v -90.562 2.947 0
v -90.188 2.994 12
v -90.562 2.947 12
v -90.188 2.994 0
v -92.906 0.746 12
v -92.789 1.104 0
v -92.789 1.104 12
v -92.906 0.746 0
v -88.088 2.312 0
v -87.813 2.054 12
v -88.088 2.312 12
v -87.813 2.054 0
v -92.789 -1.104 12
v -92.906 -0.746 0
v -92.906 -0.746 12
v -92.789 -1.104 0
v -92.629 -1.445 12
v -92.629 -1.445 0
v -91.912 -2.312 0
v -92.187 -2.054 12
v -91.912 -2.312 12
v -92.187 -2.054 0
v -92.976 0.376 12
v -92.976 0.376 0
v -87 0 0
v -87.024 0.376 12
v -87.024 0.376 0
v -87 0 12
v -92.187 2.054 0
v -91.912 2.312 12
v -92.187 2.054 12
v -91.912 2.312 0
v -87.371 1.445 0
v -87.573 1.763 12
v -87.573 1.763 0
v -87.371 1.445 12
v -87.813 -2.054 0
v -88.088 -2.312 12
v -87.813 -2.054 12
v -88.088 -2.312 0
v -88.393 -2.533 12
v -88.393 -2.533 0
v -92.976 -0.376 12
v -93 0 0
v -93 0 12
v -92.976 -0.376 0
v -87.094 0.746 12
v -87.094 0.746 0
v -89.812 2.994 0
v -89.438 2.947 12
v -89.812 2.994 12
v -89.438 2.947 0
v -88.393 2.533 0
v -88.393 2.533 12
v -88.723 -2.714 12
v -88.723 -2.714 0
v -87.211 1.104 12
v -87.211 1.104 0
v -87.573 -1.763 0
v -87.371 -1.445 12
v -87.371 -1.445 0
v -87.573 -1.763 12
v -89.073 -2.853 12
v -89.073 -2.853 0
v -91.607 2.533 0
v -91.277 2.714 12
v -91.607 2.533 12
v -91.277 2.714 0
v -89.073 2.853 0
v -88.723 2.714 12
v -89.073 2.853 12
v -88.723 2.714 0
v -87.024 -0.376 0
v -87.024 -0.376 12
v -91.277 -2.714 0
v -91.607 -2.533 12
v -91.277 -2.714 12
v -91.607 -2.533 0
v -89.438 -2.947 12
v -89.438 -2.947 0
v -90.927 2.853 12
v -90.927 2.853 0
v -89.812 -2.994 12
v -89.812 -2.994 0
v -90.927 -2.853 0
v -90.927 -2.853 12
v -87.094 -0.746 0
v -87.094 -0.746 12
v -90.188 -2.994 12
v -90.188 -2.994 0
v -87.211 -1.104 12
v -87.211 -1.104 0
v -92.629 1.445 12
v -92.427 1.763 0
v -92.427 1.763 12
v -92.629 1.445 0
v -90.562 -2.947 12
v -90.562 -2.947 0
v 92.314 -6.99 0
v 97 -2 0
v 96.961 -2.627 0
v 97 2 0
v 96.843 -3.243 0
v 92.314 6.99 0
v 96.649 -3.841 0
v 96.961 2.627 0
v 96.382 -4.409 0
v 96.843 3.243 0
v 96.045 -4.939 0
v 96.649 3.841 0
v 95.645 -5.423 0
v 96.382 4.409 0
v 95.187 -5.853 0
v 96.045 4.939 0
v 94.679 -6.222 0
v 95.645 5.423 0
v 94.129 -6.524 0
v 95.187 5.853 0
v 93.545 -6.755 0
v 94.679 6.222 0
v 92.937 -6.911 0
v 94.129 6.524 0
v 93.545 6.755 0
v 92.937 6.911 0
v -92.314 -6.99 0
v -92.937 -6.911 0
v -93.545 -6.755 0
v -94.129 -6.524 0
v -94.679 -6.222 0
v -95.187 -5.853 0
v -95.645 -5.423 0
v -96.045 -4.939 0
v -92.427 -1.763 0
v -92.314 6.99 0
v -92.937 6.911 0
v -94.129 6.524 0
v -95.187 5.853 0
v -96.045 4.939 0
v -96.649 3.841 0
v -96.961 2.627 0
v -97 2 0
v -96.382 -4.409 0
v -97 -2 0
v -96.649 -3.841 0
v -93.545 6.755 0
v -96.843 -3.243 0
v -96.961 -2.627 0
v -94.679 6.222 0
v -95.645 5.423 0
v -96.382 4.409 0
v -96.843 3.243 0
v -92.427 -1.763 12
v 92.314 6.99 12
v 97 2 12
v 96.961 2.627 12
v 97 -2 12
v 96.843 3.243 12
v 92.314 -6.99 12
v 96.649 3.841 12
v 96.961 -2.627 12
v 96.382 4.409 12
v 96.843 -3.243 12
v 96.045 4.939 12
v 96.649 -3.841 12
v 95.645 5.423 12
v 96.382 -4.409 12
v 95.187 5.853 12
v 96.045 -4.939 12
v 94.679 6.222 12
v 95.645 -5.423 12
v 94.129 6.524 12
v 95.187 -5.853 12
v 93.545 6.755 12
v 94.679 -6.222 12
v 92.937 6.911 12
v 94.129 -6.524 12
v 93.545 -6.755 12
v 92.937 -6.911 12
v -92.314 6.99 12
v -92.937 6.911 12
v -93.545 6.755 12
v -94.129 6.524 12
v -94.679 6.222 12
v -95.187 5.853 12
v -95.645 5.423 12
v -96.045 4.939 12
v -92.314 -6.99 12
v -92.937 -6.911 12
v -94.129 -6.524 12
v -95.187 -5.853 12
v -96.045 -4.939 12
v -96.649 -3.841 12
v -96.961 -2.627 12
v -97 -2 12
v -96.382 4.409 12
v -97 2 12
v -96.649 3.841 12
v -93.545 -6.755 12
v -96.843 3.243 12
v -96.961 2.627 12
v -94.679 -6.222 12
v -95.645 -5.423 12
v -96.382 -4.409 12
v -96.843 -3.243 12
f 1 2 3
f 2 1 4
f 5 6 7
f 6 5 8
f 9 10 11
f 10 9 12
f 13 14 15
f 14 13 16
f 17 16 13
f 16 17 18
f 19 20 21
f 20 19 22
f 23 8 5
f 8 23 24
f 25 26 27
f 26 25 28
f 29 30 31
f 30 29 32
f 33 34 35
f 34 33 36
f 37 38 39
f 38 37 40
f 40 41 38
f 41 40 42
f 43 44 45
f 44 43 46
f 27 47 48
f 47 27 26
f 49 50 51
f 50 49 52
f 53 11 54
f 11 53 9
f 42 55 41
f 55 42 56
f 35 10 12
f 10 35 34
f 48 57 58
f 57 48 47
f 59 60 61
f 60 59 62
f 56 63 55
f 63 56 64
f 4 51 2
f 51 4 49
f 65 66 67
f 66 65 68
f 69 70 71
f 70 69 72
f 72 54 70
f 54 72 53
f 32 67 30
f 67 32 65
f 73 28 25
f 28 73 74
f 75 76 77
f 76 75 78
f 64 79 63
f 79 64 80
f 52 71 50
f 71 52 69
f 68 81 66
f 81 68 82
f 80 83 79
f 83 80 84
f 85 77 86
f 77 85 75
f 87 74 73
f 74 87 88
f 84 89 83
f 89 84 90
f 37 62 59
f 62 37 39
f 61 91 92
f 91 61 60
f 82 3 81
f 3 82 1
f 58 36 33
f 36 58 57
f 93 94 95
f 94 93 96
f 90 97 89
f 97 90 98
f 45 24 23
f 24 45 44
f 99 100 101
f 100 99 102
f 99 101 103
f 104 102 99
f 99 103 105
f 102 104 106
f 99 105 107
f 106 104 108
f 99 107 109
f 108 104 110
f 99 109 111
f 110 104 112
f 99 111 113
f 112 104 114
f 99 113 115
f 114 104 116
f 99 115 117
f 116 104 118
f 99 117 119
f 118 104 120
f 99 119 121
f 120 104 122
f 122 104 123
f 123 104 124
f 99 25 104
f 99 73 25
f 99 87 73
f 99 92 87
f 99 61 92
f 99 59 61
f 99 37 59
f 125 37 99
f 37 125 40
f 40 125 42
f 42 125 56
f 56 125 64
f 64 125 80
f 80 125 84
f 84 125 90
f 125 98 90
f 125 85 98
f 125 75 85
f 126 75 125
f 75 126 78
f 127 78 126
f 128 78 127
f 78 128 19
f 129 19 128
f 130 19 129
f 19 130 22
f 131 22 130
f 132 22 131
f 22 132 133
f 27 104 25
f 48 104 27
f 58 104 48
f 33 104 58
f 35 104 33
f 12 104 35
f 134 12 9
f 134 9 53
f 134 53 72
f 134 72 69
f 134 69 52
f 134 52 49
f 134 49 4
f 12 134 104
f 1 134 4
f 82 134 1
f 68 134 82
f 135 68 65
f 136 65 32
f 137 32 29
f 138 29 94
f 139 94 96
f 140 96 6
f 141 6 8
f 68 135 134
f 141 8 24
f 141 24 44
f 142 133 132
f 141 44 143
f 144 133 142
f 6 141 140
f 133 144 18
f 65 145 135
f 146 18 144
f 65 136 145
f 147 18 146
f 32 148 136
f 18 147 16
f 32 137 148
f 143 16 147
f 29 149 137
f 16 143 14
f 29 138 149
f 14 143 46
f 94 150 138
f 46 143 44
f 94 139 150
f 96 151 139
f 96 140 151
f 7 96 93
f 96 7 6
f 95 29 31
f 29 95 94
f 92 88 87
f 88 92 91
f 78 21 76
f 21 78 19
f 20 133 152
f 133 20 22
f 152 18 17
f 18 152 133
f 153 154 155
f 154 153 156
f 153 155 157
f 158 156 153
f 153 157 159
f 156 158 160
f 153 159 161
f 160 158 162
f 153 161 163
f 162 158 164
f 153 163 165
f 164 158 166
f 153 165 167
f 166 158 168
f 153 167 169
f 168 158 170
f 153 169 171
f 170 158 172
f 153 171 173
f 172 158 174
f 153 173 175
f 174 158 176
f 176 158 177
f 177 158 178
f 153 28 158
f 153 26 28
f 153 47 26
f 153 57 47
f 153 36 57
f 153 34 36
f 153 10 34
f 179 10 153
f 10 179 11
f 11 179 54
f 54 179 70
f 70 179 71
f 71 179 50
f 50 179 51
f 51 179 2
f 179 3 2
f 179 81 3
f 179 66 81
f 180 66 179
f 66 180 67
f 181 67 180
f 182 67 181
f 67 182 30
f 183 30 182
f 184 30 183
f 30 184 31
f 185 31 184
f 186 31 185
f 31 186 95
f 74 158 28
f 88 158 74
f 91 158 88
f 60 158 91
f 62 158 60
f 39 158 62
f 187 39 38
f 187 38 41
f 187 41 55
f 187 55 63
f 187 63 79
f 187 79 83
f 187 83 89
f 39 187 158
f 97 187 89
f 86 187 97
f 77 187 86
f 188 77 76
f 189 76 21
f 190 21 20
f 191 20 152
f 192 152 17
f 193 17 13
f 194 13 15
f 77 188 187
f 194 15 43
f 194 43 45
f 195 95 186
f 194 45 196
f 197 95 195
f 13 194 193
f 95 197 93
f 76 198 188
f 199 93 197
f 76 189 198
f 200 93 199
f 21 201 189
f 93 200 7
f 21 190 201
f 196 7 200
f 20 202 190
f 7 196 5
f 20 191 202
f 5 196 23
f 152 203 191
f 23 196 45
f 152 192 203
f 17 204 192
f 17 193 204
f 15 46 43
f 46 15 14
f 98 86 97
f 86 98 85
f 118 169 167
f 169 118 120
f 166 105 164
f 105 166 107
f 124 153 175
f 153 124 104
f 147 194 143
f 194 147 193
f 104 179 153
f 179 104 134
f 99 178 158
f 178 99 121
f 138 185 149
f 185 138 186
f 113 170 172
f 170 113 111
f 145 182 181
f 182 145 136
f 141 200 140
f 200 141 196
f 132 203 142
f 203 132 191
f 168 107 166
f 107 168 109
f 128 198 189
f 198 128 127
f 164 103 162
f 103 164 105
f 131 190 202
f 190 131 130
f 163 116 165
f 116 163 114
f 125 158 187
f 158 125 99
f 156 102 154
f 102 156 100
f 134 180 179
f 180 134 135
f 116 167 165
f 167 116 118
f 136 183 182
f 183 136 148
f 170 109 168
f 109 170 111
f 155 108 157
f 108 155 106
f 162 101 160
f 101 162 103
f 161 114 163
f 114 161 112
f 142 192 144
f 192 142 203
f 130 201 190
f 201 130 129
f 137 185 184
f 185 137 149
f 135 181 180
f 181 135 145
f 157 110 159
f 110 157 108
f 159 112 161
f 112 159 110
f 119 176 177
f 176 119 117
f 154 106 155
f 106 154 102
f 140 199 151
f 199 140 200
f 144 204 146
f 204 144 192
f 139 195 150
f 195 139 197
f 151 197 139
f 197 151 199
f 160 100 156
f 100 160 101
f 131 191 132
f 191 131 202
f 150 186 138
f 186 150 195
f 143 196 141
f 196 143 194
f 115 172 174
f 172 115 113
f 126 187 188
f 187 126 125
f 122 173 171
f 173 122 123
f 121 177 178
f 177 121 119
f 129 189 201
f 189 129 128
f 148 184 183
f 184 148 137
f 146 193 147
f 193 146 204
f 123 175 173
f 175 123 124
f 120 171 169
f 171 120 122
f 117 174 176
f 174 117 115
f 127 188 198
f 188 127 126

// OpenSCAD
$fn = 50;


difference() {
	union() {
		hull() {
			translate(v = [-92.0000000000, 2.0000000000, 0]) {
				cylinder(h = 12, r = 5);
			}
			translate(v = [92.0000000000, 2.0000000000, 0]) {
				cylinder(h = 12, r = 5);
			}
			translate(v = [-92.0000000000, -2.0000000000, 0]) {
				cylinder(h = 12, r = 5);
			}
			translate(v = [92.0000000000, -2.0000000000, 0]) {
				cylinder(h = 12, r = 5);
			}
		}
	}
	union() {
		translate(v = [-90.0000000000, 0.0000000000, 0]) {
			cylinder(h = 12, r = 3.0000000000);
		}
		translate(v = [-90.0000000000, 0.0000000000, 0]) {
			cylinder(h = 12, r = 1.5000000000);
		}
		translate(v = [-90.0000000000, 0.0000000000, 0]) {
			cylinder(h = 12, r = 1.5000000000);
		}
		translate(v = [-90.0000000000, 0.0000000000, 0]) {
			cylinder(h = 12, r = 1.5000000000);
		}
	}
}
